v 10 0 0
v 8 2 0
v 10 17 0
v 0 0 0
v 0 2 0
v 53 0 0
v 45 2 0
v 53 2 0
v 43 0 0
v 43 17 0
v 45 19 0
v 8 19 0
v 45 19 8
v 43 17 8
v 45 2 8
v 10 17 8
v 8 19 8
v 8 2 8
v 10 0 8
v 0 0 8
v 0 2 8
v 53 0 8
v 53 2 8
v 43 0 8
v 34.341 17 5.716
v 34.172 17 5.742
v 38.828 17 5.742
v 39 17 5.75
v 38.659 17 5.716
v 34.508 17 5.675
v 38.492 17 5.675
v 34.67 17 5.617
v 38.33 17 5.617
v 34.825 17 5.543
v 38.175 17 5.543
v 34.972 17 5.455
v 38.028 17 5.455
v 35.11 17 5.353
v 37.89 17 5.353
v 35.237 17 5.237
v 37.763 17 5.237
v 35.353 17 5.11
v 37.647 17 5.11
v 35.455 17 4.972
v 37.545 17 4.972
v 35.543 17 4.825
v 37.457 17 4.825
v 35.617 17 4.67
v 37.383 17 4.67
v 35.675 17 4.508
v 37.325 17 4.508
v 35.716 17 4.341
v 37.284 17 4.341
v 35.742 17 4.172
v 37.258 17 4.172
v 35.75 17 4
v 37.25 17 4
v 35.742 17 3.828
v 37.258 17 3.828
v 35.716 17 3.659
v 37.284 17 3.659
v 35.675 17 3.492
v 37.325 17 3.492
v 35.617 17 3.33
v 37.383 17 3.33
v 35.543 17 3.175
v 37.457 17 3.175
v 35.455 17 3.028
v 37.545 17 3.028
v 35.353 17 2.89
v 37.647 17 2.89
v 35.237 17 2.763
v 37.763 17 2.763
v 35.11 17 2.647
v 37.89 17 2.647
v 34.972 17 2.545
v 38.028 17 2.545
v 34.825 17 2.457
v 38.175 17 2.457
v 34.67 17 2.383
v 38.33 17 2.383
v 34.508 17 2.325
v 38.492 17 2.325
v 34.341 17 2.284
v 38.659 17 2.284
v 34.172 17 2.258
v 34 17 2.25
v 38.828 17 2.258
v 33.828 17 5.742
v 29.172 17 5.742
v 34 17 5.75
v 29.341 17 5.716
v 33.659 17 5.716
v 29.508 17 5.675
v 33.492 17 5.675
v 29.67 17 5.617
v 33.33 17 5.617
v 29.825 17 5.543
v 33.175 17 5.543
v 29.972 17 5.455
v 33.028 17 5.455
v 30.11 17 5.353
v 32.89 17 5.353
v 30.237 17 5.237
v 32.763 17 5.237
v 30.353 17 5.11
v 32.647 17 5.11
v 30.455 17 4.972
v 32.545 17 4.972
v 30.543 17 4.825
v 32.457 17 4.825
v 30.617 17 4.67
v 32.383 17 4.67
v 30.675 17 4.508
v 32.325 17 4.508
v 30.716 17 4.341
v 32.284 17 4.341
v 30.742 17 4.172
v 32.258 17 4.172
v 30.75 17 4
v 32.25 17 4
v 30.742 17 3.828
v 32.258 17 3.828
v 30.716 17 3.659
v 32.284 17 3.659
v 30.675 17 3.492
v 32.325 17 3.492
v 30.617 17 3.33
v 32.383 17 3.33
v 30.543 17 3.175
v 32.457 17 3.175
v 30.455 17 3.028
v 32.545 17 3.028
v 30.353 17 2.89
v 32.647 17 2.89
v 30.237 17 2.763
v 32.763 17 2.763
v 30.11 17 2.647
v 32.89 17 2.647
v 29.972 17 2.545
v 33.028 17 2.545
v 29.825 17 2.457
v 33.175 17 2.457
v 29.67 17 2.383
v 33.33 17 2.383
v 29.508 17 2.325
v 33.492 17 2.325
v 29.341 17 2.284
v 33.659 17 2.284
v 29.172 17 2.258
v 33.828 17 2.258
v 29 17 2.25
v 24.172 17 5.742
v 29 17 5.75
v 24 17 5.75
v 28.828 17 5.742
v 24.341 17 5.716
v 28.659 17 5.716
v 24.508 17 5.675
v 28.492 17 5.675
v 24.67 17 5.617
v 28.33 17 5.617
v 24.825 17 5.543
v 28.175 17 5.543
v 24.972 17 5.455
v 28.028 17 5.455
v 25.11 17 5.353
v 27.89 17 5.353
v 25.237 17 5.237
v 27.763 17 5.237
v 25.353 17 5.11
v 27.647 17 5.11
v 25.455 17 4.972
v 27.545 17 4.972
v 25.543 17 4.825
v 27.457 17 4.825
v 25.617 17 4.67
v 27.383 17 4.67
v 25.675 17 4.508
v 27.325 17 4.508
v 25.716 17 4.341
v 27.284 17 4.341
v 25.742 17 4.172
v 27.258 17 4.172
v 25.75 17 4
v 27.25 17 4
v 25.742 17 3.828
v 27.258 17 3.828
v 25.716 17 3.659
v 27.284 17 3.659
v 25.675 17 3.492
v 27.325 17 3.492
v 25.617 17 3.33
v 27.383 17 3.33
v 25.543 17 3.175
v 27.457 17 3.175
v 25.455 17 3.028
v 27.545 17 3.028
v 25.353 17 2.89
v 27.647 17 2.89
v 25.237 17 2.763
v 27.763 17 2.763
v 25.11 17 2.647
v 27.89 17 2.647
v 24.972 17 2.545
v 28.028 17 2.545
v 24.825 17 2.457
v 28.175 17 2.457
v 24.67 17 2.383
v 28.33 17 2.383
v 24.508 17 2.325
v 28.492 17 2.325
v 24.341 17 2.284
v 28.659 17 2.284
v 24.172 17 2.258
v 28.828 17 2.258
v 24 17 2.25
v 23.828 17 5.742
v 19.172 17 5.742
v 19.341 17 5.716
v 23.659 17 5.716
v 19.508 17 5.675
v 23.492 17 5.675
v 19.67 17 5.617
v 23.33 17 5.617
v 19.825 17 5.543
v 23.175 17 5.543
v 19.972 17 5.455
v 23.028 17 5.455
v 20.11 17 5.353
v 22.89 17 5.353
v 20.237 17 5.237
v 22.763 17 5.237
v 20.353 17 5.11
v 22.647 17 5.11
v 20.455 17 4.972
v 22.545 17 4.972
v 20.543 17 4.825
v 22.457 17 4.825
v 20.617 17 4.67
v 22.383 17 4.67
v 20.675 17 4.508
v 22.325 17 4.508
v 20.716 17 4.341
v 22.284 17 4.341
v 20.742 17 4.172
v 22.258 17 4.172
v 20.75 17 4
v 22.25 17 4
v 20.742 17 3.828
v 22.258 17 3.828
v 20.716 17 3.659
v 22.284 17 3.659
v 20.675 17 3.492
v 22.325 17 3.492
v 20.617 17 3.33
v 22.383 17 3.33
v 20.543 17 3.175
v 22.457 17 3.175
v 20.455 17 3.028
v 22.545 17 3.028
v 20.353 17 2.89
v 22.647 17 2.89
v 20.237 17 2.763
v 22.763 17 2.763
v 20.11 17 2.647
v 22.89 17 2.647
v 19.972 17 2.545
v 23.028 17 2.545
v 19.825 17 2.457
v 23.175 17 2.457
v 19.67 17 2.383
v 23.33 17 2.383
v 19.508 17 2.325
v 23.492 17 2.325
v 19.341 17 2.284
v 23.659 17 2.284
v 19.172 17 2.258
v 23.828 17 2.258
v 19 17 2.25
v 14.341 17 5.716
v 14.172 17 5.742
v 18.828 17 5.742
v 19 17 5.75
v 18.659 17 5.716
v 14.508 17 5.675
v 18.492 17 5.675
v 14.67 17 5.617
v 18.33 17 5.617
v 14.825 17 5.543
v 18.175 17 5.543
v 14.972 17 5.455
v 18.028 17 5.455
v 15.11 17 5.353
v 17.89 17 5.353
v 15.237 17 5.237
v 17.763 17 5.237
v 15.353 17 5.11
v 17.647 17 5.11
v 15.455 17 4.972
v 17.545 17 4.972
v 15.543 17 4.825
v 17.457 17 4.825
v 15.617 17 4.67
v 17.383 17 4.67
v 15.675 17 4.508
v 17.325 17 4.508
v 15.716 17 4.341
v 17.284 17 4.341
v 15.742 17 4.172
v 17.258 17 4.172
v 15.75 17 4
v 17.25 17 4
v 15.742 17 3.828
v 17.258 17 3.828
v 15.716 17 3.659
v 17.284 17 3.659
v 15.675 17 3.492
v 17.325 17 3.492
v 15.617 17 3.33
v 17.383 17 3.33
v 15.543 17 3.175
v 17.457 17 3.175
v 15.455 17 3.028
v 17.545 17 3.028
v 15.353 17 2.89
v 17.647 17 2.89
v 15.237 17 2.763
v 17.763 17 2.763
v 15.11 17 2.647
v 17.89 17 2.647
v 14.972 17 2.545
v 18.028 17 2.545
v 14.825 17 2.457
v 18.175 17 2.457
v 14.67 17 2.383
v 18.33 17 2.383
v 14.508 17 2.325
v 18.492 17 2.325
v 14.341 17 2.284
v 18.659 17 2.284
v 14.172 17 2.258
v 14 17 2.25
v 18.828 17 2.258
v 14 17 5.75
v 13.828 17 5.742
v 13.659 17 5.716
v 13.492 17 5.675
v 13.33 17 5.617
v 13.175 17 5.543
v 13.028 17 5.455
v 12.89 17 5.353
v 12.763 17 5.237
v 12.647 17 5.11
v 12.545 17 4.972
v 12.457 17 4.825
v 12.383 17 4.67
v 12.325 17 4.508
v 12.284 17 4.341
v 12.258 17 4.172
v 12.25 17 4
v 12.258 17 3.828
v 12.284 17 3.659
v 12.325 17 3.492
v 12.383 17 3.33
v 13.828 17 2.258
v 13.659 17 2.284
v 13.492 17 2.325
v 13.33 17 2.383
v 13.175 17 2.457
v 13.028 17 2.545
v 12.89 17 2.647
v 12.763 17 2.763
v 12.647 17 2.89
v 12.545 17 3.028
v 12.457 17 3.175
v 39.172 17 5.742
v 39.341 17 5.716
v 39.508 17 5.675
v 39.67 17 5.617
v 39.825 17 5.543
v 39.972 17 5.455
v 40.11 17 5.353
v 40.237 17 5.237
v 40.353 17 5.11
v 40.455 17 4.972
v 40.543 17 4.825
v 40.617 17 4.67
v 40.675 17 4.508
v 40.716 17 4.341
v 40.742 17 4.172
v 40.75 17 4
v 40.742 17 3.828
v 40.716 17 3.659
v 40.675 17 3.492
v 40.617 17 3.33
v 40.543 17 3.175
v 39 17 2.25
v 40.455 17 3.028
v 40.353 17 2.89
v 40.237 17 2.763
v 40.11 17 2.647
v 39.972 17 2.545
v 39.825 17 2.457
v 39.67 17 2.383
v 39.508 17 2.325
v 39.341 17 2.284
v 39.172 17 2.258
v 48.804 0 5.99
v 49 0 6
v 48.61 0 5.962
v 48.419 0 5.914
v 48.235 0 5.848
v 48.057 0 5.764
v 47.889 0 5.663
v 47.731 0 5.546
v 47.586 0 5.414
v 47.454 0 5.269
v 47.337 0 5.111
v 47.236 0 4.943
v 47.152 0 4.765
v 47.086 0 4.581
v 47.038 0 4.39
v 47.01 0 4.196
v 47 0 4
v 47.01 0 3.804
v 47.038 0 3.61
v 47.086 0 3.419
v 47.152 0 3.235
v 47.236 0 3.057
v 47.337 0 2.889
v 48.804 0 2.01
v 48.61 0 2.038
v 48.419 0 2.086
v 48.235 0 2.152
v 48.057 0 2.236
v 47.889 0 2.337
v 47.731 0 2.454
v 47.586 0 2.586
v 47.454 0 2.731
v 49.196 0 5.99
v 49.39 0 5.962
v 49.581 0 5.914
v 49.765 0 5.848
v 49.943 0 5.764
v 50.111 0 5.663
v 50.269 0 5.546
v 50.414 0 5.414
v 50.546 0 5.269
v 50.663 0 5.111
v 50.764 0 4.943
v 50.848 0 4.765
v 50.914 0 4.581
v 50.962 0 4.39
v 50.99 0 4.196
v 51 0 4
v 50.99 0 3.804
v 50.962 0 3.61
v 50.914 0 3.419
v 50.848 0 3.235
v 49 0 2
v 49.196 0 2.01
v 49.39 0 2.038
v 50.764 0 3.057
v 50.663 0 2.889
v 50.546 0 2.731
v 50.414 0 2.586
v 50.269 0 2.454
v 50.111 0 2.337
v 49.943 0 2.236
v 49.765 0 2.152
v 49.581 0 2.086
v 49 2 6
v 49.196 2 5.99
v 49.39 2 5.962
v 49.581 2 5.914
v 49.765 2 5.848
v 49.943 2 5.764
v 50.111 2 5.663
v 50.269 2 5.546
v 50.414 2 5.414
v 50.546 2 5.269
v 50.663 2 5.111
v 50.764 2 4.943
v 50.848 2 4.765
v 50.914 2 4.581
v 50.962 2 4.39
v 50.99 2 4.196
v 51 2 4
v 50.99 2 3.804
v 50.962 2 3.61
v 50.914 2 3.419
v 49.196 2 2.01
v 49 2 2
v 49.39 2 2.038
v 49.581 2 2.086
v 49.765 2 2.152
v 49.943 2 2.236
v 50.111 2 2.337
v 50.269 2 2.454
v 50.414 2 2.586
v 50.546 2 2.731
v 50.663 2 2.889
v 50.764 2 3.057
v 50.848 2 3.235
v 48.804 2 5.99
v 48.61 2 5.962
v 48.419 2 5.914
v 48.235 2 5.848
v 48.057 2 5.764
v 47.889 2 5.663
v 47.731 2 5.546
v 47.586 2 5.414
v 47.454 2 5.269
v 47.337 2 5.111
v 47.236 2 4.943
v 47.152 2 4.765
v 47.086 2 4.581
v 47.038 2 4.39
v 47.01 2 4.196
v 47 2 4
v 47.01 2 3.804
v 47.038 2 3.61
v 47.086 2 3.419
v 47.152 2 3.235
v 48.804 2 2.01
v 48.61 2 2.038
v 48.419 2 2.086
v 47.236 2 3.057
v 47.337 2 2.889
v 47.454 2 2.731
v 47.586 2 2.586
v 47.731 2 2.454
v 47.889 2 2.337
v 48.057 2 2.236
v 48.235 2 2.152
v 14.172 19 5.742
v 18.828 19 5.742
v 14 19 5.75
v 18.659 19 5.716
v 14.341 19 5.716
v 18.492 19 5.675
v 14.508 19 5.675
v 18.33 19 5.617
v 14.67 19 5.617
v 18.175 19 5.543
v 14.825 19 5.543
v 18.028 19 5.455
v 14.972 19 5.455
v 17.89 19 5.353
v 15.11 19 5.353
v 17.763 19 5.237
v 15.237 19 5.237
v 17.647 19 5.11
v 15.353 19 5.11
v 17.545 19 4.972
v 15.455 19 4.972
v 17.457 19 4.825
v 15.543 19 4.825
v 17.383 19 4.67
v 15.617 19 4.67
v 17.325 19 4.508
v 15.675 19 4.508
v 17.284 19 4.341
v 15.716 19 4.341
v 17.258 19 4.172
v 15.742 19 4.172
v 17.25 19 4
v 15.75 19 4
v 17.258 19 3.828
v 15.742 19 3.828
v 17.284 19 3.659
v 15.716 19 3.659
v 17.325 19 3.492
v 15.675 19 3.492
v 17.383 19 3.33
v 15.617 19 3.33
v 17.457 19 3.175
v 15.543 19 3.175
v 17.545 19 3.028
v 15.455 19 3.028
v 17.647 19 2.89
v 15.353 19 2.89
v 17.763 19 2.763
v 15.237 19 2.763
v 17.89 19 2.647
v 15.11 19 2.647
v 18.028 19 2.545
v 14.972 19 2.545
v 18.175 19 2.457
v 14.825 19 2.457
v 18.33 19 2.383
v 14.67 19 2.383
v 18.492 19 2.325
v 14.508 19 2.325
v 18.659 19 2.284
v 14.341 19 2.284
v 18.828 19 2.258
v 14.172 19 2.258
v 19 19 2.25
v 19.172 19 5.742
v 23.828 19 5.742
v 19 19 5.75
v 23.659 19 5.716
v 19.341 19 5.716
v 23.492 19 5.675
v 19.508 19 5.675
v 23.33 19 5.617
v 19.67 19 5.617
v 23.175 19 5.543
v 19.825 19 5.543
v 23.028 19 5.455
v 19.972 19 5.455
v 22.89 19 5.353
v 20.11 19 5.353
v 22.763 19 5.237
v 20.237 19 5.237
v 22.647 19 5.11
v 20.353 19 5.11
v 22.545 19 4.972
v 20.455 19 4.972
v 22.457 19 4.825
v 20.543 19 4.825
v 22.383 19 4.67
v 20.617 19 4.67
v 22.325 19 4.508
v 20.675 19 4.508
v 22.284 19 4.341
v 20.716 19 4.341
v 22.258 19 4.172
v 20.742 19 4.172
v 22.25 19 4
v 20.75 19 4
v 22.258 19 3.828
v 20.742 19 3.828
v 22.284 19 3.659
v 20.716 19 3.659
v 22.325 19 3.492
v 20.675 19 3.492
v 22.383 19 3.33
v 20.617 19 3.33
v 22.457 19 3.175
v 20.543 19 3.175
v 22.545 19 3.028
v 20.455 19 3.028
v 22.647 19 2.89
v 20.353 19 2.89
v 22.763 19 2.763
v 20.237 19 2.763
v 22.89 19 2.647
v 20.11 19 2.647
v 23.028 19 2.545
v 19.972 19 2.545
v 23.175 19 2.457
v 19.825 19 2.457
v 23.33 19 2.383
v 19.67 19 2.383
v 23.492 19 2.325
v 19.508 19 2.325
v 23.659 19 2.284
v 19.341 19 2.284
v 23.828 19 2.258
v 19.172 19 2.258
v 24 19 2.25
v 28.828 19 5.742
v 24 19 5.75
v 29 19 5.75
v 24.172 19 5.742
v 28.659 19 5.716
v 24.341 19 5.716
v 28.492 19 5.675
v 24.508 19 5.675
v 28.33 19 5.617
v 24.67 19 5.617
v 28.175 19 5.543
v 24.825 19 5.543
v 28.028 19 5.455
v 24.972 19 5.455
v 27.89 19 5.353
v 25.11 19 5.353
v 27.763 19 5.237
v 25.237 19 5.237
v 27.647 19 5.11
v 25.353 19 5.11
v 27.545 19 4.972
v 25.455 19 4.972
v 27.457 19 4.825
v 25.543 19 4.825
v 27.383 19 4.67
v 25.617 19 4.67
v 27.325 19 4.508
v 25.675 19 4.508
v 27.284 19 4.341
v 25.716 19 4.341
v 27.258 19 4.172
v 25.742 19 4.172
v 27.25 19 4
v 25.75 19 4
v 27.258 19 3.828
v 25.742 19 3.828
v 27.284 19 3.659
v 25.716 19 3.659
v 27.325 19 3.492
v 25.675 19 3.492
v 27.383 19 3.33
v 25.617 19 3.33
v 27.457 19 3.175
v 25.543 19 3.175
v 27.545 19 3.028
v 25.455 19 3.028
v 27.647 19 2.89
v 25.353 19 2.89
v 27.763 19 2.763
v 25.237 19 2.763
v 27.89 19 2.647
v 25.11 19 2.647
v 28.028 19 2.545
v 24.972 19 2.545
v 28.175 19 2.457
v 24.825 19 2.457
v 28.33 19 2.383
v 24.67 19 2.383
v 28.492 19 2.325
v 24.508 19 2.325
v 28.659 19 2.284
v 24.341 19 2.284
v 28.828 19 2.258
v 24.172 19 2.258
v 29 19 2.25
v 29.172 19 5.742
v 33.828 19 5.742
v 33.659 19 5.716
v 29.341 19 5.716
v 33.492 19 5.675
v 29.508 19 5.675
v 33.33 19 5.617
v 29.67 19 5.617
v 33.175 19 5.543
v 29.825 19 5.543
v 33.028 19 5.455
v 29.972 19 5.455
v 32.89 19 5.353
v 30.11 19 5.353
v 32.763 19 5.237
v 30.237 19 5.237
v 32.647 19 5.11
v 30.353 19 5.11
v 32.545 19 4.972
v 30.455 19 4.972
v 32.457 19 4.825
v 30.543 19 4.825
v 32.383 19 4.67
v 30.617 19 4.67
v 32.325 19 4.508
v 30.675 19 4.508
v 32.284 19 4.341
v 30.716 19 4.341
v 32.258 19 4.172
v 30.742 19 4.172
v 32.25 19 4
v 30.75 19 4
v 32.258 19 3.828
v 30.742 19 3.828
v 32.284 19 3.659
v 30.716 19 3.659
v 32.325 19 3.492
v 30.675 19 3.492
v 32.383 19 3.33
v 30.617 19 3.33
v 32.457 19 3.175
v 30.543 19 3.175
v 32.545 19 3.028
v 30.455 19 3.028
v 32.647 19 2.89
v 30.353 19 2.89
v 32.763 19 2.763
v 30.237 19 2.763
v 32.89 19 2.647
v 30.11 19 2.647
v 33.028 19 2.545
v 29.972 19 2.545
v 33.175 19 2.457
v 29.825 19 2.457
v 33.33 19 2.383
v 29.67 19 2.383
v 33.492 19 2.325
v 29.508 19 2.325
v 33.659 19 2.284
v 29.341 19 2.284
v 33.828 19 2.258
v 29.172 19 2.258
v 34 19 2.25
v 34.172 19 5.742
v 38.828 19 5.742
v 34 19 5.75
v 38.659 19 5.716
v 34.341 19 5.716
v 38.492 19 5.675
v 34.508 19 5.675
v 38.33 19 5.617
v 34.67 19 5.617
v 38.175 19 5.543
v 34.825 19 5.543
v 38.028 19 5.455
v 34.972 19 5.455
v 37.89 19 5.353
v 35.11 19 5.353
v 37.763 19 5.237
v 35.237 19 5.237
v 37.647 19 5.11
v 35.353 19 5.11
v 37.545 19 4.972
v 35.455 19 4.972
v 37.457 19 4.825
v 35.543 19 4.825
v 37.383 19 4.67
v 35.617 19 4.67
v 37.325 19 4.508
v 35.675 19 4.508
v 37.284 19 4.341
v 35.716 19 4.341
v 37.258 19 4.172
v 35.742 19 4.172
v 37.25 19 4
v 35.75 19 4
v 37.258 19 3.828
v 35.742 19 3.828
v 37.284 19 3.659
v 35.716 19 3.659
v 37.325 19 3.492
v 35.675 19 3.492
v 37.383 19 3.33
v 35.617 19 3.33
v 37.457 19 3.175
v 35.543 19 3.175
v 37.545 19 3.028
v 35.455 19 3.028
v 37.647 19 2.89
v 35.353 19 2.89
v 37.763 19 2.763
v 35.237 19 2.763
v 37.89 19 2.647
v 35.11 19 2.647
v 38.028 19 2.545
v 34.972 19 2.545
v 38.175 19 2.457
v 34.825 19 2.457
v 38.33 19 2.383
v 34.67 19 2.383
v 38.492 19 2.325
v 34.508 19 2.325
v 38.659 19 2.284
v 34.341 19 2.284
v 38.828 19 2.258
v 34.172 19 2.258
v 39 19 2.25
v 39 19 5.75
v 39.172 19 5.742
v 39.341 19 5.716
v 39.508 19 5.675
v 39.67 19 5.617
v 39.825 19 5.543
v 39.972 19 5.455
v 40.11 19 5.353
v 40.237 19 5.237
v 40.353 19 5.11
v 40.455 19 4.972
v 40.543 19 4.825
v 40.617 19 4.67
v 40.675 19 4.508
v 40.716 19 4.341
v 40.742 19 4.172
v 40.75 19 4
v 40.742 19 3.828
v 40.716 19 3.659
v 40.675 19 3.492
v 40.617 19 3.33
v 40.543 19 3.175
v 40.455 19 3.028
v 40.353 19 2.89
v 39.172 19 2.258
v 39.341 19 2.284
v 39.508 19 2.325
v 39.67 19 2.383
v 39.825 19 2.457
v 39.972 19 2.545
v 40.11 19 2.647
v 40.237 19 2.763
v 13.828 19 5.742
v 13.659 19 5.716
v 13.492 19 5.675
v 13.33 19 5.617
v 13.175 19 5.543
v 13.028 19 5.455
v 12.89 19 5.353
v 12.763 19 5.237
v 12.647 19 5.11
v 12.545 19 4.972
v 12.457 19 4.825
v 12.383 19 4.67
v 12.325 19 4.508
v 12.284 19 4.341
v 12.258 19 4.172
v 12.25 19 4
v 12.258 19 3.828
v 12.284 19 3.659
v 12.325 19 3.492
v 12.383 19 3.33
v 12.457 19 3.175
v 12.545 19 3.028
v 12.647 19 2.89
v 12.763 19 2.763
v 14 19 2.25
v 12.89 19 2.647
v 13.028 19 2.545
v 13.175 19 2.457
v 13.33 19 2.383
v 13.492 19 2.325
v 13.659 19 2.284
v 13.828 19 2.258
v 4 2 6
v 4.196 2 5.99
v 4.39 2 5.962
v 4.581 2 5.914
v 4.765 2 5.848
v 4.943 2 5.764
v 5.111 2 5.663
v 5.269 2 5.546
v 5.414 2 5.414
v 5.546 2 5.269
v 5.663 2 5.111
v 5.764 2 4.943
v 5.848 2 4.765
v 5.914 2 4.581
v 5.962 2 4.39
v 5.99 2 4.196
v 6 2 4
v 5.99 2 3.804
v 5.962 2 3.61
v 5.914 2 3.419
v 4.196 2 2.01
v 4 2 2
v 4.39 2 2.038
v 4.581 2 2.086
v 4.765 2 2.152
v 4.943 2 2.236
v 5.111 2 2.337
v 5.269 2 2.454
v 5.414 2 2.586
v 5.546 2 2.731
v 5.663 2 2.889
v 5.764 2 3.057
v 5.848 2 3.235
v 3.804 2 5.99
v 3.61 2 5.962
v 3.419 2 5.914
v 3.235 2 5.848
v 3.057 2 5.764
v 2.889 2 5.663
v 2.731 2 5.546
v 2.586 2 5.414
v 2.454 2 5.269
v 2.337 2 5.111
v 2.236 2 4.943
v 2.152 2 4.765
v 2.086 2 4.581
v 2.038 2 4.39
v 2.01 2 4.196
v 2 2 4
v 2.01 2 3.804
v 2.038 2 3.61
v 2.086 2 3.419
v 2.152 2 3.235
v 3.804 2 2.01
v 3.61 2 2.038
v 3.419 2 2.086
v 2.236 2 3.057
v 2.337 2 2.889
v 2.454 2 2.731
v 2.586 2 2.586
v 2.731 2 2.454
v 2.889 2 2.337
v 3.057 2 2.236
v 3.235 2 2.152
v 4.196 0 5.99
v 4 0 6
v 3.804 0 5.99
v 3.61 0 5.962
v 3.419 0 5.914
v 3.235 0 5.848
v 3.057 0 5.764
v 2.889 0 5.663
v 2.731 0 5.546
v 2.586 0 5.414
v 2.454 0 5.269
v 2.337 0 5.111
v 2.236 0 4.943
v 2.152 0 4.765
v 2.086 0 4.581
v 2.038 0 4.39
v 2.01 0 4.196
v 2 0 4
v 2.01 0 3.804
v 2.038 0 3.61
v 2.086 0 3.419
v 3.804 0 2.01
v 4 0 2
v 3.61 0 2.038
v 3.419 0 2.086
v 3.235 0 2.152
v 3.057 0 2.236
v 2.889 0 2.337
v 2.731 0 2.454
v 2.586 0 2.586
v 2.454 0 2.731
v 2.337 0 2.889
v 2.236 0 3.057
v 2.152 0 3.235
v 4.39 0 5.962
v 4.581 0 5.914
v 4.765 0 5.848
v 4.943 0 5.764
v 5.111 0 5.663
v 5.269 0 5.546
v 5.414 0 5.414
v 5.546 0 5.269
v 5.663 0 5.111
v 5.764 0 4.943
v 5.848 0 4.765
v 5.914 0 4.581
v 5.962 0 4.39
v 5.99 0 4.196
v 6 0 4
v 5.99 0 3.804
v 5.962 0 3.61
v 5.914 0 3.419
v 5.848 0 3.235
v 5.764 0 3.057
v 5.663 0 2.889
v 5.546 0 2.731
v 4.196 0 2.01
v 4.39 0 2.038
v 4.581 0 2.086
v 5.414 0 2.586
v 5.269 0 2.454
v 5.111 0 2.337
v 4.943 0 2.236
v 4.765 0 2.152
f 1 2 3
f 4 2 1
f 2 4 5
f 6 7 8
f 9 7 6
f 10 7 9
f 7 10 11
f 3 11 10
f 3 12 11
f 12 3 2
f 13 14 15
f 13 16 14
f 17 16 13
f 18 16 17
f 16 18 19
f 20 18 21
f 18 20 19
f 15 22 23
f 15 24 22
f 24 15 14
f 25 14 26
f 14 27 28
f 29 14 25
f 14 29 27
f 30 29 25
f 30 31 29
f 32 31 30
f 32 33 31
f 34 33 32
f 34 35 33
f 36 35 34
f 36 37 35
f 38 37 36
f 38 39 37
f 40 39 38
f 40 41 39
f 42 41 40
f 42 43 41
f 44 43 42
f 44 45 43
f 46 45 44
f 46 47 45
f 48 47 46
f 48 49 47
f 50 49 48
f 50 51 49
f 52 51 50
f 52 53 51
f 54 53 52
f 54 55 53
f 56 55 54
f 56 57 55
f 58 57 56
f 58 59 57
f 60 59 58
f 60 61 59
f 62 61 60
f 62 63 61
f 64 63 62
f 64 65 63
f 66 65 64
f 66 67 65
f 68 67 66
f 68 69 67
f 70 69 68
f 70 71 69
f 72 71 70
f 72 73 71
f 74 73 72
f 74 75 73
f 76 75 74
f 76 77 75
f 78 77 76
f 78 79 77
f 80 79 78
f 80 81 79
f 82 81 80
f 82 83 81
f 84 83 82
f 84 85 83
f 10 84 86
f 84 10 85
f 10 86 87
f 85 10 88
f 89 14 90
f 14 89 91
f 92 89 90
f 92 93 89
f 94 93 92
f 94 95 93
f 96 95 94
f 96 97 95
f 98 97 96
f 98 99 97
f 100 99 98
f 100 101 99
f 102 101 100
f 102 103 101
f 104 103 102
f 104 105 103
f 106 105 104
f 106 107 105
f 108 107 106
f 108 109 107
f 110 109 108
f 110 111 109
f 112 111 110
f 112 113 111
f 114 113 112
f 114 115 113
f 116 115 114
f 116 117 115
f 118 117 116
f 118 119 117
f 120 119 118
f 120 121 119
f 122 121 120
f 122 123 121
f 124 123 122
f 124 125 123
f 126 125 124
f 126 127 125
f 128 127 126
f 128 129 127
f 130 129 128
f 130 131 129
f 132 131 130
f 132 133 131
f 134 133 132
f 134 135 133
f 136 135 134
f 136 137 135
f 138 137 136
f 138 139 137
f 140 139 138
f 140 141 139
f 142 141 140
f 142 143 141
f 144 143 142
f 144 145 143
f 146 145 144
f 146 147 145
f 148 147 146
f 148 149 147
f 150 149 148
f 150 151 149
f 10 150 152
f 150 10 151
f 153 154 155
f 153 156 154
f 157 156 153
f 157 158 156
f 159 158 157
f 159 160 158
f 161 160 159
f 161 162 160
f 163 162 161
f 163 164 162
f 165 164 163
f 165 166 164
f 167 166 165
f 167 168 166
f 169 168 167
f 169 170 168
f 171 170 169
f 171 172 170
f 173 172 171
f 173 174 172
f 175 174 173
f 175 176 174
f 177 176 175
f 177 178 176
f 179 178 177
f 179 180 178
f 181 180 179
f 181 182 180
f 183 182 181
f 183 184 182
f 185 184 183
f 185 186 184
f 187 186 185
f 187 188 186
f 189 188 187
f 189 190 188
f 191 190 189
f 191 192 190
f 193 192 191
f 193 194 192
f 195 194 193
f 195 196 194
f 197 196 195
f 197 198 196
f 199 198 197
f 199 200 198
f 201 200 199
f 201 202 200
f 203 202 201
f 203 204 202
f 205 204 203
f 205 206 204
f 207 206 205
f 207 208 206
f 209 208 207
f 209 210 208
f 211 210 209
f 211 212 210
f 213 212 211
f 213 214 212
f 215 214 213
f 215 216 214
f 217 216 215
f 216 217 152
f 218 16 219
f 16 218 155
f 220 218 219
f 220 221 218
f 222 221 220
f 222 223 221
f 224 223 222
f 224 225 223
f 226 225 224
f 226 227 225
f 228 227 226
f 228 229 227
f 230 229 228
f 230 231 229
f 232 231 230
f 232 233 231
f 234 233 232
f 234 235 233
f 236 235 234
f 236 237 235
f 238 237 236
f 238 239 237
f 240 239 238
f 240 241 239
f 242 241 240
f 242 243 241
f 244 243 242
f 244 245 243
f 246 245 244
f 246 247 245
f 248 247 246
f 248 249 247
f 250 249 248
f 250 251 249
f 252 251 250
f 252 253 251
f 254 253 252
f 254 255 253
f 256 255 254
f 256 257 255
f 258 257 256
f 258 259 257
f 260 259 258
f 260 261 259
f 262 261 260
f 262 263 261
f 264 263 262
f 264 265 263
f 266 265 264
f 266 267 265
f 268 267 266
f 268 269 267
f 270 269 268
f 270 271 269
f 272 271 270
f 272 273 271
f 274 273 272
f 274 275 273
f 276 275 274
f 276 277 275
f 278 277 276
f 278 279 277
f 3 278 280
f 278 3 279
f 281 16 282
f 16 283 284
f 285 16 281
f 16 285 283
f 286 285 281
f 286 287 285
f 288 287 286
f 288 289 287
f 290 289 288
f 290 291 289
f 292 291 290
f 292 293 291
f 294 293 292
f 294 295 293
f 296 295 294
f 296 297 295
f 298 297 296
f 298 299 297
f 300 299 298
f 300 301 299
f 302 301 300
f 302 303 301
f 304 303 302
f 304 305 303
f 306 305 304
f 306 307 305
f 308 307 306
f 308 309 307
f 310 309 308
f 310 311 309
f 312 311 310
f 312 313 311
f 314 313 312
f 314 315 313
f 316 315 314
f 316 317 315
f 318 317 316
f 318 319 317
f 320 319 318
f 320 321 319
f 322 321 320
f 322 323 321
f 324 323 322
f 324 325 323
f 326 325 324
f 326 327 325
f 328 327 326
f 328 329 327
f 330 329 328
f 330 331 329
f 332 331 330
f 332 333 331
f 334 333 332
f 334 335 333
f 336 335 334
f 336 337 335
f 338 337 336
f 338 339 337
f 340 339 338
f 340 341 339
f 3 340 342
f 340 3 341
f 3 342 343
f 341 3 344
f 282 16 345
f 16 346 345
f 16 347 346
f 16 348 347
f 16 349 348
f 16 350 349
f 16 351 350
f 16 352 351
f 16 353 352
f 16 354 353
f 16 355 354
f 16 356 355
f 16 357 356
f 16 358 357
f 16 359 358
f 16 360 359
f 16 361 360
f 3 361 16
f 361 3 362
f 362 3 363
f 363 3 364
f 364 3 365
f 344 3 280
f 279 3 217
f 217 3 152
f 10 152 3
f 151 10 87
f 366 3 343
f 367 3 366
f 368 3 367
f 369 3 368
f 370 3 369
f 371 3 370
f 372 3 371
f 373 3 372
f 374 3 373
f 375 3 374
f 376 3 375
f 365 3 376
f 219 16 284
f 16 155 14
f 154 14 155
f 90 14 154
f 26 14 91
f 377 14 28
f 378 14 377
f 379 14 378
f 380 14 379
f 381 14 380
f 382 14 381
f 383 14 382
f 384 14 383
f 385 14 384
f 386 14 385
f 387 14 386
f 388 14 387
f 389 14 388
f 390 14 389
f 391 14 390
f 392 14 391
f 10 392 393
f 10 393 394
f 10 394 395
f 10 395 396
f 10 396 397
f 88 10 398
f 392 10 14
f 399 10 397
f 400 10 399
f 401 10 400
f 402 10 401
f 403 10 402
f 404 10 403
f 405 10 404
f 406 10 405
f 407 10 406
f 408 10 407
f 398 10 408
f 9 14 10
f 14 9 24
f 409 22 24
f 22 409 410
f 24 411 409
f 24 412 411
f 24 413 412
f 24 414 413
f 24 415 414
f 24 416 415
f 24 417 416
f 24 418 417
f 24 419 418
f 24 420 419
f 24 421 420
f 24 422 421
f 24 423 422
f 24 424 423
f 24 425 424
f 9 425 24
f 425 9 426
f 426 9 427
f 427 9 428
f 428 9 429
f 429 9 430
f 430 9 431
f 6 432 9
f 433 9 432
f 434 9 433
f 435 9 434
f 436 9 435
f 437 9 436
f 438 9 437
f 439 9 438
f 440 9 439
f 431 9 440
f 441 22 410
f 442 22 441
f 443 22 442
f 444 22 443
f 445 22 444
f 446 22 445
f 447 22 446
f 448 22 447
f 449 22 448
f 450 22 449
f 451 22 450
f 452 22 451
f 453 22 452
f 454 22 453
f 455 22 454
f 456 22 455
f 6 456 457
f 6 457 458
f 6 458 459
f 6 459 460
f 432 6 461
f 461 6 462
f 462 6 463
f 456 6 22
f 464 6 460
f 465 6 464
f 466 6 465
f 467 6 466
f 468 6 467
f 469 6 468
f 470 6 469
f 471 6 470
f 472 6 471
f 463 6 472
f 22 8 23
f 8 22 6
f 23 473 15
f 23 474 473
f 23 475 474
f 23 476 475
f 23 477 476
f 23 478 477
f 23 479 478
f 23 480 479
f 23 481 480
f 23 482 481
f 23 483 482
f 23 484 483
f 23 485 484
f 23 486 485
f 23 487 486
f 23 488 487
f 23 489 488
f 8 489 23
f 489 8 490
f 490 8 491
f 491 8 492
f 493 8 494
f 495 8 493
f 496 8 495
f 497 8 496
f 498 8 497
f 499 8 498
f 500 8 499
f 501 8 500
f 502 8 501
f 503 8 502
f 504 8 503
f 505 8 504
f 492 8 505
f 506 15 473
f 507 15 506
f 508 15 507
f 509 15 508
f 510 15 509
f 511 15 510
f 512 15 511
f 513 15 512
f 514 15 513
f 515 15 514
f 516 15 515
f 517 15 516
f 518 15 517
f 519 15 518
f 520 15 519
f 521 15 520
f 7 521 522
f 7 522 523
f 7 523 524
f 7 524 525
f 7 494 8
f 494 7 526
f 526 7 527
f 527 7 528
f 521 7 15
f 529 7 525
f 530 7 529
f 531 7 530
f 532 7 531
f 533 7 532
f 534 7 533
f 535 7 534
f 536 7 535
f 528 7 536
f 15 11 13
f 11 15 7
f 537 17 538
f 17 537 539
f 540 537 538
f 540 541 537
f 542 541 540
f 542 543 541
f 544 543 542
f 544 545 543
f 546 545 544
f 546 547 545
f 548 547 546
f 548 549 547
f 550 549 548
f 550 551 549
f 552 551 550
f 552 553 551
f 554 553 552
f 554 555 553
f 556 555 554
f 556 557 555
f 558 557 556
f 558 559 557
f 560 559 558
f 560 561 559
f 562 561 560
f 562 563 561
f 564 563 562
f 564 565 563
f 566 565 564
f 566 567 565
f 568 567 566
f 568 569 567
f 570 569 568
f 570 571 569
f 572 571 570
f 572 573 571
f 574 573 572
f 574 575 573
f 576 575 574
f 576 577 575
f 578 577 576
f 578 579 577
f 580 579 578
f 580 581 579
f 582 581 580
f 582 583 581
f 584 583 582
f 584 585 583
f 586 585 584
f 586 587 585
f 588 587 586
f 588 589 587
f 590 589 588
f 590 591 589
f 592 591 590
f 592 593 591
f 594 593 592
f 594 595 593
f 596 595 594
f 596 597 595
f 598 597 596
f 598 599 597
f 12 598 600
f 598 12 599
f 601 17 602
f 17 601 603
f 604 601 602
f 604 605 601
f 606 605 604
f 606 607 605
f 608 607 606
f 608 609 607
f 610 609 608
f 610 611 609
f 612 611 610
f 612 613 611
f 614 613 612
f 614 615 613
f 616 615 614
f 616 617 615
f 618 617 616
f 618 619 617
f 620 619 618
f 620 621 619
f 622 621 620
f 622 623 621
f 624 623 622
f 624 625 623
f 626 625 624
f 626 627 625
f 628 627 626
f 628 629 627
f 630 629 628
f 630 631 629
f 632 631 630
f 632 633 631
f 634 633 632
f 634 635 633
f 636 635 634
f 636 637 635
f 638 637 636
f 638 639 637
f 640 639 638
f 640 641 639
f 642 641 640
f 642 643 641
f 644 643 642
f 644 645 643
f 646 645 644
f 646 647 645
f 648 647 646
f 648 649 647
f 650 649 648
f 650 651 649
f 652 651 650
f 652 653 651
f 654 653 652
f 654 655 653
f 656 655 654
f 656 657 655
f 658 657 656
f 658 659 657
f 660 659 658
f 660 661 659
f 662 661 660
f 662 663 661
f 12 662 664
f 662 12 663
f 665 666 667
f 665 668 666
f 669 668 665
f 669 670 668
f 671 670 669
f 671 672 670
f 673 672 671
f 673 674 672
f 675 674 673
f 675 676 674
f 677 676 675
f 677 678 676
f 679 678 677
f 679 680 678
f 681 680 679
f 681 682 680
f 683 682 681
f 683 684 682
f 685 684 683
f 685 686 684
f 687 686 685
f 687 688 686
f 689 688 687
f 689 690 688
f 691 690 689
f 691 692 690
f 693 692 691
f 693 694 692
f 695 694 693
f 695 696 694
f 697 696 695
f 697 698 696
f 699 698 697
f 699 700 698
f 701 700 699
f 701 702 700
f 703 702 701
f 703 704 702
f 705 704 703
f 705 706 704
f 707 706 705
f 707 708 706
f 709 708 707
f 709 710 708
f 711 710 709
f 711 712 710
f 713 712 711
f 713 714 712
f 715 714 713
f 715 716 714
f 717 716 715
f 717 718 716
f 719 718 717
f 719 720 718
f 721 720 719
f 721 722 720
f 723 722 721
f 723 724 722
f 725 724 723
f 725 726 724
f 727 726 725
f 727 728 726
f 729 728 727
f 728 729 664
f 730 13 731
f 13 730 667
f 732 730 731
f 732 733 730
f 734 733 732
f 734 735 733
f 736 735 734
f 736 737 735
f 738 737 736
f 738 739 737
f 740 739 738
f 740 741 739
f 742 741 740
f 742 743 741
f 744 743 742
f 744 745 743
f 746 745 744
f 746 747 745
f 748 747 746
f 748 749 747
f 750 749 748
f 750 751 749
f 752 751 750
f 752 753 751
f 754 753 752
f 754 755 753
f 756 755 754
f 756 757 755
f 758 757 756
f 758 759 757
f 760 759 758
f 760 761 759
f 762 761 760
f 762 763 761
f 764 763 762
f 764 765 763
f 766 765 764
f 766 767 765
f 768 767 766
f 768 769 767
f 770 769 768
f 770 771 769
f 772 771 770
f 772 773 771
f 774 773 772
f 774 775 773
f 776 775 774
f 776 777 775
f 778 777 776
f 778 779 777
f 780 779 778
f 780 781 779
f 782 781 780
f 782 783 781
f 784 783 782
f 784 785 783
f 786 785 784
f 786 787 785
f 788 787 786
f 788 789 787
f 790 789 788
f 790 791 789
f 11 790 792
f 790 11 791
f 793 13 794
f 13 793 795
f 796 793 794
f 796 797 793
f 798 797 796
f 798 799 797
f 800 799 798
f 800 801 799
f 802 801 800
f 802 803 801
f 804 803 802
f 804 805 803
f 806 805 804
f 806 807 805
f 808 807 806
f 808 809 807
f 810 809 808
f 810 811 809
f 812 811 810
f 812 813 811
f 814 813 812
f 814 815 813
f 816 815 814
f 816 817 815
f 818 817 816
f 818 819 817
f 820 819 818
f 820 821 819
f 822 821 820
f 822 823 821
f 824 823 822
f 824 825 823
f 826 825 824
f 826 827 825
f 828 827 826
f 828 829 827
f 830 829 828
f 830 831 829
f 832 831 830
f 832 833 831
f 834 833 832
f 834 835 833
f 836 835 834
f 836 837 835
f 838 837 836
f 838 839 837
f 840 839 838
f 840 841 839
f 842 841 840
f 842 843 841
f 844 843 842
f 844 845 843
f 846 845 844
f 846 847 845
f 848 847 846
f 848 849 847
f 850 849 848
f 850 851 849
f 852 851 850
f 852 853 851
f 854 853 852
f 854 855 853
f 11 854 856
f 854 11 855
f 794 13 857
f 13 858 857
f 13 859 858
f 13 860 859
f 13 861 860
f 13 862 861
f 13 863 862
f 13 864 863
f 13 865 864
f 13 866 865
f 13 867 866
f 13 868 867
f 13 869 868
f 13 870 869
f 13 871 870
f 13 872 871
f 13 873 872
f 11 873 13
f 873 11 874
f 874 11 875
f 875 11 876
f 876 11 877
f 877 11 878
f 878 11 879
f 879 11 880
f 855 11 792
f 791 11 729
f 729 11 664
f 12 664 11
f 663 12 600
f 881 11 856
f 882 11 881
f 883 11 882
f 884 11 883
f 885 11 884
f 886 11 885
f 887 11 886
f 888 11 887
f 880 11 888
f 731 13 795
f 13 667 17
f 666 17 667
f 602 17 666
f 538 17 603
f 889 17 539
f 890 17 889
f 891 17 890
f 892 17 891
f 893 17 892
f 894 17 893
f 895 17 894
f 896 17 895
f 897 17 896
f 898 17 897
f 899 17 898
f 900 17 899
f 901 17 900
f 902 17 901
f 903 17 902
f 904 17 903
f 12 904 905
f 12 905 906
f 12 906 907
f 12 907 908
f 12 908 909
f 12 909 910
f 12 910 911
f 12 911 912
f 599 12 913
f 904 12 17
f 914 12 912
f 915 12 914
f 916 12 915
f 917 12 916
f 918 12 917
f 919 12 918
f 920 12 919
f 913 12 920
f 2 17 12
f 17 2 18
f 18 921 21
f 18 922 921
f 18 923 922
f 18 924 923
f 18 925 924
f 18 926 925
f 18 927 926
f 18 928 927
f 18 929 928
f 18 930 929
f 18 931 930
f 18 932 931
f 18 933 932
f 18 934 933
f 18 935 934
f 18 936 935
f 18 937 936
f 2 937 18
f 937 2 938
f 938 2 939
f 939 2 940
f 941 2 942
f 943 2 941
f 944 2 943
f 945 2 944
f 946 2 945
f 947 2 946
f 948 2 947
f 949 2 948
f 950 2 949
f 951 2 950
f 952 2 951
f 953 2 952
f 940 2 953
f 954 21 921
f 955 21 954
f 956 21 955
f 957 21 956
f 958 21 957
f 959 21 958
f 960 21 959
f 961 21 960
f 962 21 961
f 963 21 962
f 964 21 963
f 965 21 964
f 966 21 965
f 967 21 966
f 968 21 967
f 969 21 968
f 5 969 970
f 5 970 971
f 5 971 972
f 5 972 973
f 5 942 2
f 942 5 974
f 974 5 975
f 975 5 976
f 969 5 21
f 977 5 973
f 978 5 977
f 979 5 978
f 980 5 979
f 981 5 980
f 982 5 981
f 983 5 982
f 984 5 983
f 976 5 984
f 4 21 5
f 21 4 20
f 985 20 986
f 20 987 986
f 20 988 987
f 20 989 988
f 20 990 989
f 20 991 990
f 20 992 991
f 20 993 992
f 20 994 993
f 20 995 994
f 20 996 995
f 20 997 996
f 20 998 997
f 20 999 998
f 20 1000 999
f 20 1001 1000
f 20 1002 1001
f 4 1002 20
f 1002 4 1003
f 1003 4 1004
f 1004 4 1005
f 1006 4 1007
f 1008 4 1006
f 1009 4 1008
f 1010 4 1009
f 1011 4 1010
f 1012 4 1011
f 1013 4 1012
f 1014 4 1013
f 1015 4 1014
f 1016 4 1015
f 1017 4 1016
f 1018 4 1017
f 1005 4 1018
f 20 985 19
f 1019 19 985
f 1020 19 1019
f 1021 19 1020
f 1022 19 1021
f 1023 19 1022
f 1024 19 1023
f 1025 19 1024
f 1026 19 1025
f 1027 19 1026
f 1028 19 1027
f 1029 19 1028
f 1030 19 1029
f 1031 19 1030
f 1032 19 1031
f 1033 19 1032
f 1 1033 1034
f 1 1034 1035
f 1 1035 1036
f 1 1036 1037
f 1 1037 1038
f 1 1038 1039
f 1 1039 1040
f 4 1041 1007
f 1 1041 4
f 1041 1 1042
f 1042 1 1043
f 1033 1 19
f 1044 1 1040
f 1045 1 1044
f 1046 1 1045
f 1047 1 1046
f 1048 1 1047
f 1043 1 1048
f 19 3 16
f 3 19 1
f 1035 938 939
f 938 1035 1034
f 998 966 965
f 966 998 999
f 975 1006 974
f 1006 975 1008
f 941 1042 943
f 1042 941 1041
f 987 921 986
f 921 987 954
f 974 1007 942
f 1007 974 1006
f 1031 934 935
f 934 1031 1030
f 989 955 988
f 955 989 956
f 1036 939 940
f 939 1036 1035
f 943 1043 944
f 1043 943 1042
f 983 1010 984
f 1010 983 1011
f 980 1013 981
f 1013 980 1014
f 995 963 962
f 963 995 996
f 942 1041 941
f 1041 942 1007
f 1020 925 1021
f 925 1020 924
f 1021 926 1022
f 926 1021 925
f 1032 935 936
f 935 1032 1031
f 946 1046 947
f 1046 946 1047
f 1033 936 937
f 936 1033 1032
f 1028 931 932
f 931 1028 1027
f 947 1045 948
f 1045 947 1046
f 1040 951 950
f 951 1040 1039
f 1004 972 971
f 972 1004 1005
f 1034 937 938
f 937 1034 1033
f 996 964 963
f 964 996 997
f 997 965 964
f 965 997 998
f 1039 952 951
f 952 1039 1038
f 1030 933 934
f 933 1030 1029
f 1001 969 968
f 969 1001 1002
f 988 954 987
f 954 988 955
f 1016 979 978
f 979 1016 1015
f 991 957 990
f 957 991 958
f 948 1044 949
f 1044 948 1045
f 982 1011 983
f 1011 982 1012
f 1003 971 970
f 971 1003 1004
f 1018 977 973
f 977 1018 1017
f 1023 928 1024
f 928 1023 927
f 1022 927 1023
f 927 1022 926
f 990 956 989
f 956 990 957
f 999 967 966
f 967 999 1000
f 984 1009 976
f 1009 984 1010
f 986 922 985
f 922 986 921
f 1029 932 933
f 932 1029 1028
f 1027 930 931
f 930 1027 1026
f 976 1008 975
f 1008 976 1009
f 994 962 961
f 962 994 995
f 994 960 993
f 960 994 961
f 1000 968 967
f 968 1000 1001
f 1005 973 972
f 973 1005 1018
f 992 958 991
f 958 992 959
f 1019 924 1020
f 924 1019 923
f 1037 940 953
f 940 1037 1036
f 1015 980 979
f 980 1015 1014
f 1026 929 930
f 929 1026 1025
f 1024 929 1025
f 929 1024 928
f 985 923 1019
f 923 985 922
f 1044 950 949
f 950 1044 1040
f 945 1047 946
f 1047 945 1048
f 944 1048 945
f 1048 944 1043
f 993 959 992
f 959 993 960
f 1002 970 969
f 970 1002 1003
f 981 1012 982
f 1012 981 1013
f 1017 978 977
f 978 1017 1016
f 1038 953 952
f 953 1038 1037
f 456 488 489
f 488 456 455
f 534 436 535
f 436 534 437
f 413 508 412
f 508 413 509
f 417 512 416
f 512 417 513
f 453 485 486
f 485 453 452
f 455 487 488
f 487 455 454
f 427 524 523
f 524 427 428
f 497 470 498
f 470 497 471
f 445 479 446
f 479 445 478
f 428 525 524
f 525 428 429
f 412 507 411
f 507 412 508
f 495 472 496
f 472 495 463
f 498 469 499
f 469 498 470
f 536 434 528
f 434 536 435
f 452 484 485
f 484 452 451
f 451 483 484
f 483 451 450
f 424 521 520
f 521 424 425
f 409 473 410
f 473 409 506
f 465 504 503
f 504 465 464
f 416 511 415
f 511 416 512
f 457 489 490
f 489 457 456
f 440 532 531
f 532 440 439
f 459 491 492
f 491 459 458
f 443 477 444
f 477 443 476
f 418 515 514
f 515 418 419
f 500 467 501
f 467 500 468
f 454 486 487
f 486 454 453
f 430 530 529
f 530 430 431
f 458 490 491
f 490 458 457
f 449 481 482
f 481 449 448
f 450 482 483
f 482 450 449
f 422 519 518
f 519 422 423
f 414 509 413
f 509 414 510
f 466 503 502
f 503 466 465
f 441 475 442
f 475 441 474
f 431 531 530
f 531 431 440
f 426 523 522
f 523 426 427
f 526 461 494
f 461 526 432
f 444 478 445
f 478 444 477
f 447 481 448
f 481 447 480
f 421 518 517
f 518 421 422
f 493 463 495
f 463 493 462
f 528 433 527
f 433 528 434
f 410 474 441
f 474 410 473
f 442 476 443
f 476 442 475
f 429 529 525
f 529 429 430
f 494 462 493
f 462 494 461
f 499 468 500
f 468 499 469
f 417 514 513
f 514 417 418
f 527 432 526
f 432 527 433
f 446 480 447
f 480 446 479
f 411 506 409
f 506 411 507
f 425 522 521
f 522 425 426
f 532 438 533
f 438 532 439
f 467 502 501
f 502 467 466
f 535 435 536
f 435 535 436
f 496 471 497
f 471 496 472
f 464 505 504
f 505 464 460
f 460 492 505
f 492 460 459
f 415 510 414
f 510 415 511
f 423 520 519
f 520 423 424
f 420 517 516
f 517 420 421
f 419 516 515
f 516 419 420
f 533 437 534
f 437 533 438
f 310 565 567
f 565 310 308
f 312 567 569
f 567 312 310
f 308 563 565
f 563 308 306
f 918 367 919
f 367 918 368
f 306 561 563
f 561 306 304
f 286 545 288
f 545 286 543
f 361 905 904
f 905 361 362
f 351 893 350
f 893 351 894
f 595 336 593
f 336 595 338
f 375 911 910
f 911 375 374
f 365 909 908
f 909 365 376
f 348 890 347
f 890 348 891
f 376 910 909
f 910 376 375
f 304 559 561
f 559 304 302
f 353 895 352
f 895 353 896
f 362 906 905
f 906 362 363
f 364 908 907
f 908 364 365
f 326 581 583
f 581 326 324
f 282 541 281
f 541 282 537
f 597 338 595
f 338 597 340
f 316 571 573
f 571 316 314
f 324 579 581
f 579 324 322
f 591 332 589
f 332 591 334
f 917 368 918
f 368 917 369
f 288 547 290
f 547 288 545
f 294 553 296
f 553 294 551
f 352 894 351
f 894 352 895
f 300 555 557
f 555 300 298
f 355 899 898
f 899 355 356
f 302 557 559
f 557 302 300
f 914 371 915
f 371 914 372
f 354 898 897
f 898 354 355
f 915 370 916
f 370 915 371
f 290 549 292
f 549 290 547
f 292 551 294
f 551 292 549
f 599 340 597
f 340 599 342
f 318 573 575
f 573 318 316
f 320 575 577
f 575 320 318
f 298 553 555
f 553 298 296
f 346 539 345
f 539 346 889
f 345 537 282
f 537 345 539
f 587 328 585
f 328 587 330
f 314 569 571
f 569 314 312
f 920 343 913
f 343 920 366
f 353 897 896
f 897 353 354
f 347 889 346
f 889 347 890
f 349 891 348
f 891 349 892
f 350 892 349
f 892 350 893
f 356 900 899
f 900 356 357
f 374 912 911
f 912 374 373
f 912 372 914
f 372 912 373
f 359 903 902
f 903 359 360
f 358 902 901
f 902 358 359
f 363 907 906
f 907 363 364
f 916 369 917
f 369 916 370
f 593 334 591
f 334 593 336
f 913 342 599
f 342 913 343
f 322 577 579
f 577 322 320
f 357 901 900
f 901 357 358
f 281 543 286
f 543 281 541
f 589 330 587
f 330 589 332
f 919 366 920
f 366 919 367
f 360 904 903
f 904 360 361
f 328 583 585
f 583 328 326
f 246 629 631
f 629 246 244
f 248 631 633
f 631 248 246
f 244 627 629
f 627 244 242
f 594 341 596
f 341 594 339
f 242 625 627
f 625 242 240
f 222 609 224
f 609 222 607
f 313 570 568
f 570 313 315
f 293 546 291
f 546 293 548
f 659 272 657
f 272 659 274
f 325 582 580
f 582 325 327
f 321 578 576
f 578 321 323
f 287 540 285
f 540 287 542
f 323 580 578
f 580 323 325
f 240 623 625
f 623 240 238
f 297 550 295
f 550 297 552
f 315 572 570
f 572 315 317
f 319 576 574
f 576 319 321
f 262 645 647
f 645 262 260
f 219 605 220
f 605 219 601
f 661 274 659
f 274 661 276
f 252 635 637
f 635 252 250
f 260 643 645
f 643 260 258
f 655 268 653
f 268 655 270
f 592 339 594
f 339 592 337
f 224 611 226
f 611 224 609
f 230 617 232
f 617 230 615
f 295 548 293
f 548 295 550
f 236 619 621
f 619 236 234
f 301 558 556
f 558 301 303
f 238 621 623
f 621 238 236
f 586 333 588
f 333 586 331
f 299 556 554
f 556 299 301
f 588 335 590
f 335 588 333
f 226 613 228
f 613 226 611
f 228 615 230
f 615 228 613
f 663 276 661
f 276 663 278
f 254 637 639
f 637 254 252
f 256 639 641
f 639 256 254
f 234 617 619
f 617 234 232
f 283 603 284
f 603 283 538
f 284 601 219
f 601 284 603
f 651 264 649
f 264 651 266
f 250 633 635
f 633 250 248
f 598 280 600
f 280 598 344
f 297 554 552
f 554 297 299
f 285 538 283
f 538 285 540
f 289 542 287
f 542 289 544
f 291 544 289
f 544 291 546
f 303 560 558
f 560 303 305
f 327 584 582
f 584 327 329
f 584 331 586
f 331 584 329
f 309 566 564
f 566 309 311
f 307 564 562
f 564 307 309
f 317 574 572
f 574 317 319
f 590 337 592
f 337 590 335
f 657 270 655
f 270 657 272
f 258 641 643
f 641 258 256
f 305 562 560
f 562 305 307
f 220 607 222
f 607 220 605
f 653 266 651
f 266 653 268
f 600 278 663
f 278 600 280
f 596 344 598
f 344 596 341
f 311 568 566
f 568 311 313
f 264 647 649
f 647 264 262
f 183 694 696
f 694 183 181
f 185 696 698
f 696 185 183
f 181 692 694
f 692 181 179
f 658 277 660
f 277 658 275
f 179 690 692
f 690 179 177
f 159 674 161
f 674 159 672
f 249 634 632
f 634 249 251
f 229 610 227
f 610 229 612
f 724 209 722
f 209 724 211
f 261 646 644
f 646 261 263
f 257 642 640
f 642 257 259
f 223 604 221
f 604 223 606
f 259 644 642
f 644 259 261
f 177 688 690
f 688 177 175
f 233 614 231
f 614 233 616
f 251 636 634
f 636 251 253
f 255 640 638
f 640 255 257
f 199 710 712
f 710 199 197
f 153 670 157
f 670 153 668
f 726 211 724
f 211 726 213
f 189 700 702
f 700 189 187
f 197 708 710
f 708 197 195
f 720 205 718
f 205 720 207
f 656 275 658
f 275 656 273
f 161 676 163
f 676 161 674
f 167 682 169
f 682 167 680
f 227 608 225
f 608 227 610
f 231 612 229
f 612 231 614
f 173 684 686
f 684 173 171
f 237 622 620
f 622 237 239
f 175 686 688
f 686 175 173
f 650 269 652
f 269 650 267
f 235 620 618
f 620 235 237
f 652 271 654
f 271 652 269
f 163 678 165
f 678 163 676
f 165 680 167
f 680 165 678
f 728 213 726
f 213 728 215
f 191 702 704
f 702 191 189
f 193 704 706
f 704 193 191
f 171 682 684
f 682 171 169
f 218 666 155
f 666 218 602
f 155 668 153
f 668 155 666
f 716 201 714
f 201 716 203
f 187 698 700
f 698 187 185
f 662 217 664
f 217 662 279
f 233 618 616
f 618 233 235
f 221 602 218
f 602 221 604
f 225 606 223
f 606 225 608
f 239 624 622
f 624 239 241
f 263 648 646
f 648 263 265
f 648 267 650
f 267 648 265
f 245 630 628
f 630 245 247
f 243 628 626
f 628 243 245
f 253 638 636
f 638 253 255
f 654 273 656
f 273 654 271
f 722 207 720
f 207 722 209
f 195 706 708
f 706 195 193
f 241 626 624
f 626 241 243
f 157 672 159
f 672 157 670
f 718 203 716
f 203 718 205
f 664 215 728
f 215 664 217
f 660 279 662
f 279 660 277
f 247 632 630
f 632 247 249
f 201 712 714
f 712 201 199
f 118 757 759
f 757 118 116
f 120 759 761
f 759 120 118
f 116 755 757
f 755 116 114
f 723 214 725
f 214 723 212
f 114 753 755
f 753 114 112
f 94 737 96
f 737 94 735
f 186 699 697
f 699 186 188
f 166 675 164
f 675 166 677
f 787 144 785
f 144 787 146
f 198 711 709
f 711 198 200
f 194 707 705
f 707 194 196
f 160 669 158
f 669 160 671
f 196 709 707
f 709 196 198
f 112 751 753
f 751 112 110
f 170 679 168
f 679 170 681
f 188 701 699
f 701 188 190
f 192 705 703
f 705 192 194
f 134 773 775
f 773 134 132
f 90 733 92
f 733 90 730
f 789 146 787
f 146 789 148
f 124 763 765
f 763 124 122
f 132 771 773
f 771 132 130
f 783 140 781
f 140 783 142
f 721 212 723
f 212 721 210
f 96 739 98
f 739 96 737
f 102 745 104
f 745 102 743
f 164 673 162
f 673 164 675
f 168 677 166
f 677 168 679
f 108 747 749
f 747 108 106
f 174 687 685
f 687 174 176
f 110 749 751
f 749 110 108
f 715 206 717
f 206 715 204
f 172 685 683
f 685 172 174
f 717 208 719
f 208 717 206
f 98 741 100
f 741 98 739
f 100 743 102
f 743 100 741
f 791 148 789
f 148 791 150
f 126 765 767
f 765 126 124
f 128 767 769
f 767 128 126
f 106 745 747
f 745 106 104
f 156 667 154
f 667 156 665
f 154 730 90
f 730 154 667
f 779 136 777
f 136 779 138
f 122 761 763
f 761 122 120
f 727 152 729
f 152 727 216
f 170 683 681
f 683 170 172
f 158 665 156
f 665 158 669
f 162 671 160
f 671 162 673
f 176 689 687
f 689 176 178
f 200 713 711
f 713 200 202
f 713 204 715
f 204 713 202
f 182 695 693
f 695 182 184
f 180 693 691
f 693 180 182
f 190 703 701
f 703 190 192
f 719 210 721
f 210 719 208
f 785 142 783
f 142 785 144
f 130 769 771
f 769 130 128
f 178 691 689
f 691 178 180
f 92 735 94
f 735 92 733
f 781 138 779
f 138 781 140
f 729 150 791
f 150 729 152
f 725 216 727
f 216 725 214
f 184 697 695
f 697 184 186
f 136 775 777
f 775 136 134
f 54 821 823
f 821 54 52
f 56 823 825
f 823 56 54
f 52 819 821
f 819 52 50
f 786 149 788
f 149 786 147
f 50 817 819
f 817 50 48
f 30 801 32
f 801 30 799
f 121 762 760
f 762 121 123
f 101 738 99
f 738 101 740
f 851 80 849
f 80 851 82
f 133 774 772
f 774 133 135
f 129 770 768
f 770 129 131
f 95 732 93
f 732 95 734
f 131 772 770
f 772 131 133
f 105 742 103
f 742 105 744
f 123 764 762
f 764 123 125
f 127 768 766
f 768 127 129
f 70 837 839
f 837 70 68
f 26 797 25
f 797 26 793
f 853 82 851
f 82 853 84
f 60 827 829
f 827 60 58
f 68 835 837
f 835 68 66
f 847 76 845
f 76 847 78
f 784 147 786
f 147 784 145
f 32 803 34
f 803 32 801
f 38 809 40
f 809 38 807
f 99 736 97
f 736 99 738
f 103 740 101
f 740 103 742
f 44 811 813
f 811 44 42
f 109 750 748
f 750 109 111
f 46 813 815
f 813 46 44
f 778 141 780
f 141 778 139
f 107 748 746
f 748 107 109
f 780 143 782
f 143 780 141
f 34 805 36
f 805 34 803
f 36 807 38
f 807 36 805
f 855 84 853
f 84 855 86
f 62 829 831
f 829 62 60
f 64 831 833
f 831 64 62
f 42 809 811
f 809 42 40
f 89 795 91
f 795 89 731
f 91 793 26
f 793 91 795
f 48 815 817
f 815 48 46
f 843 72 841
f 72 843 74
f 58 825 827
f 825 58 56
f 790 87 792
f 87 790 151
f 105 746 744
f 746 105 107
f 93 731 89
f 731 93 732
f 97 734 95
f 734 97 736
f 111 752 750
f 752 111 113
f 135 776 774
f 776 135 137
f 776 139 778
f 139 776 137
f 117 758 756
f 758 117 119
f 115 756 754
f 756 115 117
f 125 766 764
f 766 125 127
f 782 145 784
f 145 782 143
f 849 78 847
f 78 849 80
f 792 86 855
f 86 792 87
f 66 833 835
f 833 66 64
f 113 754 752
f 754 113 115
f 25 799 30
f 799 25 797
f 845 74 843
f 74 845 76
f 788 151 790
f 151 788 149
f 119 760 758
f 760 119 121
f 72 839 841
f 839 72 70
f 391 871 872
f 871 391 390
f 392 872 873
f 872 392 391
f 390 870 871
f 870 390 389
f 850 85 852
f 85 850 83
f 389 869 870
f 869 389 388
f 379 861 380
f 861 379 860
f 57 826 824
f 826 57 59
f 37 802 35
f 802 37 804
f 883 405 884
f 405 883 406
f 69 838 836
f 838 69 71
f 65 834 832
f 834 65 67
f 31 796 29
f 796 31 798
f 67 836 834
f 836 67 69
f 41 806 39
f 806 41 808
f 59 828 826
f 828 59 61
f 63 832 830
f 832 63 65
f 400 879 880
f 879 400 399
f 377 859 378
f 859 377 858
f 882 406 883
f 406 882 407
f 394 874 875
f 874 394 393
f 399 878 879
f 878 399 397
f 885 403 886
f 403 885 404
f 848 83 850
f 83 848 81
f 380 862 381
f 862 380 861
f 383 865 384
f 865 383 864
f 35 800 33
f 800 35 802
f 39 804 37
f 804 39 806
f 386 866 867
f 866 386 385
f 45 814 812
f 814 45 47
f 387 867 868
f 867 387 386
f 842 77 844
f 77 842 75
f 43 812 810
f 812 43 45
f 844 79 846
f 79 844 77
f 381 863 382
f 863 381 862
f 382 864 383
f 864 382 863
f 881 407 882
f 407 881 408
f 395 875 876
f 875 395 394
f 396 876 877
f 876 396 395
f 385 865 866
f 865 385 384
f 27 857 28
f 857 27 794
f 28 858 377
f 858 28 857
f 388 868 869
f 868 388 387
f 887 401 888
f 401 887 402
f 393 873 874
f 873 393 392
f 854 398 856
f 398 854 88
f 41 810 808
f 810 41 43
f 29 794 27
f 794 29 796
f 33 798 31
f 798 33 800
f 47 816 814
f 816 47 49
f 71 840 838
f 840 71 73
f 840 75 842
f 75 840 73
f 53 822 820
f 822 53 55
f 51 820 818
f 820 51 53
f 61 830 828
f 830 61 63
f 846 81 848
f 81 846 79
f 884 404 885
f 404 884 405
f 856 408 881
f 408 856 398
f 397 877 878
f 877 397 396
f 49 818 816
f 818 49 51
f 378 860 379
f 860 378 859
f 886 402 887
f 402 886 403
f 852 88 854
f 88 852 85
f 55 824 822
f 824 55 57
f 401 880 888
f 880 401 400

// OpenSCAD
$fn = 64;
difference()
{
    linear_extrude(8) polygon([
        [ 0, 0 ], [ 10, 0 ], [ 10, 17 ], [ 43, 17 ], [ 43, 0 ], [ 53, 0 ], [ 53, 2 ], [ 45, 2 ], [ 45, 19 ], [ 8, 19 ],
        [ 8, 2 ], [ 0, 2 ], [ 0, 0 ]
    ]);
    translate([ 4, 0, 4 ]) rotate([ 90, 0, 0 ]) cylinder(d = 4, h = 6, center = true);
    translate([ 49, 0, 4 ]) rotate([ 90, 0, 0 ]) cylinder(d = 4, h = 6, center = true);

    translate([ 14, 17, 4 ]) rotate([ 90, 0, 0 ]) cylinder(d = 3.5, h = 6, center = true);
    translate([ 19, 17, 4 ]) rotate([ 90, 0, 0 ]) cylinder(d = 3.5, h = 6, center = true);
    translate([ 24, 17, 4 ]) rotate([ 90, 0, 0 ]) cylinder(d = 3.5, h = 6, center = true);
    translate([ 29, 17, 4 ]) rotate([ 90, 0, 0 ]) cylinder(d = 3.5, h = 6, center = true);
    translate([ 34, 17, 4 ]) rotate([ 90, 0, 0 ]) cylinder(d = 3.5, h = 6, center = true);
    translate([ 39, 17, 4 ]) rotate([ 90, 0, 0 ]) cylinder(d = 3.5, h = 6, center = true);
}
